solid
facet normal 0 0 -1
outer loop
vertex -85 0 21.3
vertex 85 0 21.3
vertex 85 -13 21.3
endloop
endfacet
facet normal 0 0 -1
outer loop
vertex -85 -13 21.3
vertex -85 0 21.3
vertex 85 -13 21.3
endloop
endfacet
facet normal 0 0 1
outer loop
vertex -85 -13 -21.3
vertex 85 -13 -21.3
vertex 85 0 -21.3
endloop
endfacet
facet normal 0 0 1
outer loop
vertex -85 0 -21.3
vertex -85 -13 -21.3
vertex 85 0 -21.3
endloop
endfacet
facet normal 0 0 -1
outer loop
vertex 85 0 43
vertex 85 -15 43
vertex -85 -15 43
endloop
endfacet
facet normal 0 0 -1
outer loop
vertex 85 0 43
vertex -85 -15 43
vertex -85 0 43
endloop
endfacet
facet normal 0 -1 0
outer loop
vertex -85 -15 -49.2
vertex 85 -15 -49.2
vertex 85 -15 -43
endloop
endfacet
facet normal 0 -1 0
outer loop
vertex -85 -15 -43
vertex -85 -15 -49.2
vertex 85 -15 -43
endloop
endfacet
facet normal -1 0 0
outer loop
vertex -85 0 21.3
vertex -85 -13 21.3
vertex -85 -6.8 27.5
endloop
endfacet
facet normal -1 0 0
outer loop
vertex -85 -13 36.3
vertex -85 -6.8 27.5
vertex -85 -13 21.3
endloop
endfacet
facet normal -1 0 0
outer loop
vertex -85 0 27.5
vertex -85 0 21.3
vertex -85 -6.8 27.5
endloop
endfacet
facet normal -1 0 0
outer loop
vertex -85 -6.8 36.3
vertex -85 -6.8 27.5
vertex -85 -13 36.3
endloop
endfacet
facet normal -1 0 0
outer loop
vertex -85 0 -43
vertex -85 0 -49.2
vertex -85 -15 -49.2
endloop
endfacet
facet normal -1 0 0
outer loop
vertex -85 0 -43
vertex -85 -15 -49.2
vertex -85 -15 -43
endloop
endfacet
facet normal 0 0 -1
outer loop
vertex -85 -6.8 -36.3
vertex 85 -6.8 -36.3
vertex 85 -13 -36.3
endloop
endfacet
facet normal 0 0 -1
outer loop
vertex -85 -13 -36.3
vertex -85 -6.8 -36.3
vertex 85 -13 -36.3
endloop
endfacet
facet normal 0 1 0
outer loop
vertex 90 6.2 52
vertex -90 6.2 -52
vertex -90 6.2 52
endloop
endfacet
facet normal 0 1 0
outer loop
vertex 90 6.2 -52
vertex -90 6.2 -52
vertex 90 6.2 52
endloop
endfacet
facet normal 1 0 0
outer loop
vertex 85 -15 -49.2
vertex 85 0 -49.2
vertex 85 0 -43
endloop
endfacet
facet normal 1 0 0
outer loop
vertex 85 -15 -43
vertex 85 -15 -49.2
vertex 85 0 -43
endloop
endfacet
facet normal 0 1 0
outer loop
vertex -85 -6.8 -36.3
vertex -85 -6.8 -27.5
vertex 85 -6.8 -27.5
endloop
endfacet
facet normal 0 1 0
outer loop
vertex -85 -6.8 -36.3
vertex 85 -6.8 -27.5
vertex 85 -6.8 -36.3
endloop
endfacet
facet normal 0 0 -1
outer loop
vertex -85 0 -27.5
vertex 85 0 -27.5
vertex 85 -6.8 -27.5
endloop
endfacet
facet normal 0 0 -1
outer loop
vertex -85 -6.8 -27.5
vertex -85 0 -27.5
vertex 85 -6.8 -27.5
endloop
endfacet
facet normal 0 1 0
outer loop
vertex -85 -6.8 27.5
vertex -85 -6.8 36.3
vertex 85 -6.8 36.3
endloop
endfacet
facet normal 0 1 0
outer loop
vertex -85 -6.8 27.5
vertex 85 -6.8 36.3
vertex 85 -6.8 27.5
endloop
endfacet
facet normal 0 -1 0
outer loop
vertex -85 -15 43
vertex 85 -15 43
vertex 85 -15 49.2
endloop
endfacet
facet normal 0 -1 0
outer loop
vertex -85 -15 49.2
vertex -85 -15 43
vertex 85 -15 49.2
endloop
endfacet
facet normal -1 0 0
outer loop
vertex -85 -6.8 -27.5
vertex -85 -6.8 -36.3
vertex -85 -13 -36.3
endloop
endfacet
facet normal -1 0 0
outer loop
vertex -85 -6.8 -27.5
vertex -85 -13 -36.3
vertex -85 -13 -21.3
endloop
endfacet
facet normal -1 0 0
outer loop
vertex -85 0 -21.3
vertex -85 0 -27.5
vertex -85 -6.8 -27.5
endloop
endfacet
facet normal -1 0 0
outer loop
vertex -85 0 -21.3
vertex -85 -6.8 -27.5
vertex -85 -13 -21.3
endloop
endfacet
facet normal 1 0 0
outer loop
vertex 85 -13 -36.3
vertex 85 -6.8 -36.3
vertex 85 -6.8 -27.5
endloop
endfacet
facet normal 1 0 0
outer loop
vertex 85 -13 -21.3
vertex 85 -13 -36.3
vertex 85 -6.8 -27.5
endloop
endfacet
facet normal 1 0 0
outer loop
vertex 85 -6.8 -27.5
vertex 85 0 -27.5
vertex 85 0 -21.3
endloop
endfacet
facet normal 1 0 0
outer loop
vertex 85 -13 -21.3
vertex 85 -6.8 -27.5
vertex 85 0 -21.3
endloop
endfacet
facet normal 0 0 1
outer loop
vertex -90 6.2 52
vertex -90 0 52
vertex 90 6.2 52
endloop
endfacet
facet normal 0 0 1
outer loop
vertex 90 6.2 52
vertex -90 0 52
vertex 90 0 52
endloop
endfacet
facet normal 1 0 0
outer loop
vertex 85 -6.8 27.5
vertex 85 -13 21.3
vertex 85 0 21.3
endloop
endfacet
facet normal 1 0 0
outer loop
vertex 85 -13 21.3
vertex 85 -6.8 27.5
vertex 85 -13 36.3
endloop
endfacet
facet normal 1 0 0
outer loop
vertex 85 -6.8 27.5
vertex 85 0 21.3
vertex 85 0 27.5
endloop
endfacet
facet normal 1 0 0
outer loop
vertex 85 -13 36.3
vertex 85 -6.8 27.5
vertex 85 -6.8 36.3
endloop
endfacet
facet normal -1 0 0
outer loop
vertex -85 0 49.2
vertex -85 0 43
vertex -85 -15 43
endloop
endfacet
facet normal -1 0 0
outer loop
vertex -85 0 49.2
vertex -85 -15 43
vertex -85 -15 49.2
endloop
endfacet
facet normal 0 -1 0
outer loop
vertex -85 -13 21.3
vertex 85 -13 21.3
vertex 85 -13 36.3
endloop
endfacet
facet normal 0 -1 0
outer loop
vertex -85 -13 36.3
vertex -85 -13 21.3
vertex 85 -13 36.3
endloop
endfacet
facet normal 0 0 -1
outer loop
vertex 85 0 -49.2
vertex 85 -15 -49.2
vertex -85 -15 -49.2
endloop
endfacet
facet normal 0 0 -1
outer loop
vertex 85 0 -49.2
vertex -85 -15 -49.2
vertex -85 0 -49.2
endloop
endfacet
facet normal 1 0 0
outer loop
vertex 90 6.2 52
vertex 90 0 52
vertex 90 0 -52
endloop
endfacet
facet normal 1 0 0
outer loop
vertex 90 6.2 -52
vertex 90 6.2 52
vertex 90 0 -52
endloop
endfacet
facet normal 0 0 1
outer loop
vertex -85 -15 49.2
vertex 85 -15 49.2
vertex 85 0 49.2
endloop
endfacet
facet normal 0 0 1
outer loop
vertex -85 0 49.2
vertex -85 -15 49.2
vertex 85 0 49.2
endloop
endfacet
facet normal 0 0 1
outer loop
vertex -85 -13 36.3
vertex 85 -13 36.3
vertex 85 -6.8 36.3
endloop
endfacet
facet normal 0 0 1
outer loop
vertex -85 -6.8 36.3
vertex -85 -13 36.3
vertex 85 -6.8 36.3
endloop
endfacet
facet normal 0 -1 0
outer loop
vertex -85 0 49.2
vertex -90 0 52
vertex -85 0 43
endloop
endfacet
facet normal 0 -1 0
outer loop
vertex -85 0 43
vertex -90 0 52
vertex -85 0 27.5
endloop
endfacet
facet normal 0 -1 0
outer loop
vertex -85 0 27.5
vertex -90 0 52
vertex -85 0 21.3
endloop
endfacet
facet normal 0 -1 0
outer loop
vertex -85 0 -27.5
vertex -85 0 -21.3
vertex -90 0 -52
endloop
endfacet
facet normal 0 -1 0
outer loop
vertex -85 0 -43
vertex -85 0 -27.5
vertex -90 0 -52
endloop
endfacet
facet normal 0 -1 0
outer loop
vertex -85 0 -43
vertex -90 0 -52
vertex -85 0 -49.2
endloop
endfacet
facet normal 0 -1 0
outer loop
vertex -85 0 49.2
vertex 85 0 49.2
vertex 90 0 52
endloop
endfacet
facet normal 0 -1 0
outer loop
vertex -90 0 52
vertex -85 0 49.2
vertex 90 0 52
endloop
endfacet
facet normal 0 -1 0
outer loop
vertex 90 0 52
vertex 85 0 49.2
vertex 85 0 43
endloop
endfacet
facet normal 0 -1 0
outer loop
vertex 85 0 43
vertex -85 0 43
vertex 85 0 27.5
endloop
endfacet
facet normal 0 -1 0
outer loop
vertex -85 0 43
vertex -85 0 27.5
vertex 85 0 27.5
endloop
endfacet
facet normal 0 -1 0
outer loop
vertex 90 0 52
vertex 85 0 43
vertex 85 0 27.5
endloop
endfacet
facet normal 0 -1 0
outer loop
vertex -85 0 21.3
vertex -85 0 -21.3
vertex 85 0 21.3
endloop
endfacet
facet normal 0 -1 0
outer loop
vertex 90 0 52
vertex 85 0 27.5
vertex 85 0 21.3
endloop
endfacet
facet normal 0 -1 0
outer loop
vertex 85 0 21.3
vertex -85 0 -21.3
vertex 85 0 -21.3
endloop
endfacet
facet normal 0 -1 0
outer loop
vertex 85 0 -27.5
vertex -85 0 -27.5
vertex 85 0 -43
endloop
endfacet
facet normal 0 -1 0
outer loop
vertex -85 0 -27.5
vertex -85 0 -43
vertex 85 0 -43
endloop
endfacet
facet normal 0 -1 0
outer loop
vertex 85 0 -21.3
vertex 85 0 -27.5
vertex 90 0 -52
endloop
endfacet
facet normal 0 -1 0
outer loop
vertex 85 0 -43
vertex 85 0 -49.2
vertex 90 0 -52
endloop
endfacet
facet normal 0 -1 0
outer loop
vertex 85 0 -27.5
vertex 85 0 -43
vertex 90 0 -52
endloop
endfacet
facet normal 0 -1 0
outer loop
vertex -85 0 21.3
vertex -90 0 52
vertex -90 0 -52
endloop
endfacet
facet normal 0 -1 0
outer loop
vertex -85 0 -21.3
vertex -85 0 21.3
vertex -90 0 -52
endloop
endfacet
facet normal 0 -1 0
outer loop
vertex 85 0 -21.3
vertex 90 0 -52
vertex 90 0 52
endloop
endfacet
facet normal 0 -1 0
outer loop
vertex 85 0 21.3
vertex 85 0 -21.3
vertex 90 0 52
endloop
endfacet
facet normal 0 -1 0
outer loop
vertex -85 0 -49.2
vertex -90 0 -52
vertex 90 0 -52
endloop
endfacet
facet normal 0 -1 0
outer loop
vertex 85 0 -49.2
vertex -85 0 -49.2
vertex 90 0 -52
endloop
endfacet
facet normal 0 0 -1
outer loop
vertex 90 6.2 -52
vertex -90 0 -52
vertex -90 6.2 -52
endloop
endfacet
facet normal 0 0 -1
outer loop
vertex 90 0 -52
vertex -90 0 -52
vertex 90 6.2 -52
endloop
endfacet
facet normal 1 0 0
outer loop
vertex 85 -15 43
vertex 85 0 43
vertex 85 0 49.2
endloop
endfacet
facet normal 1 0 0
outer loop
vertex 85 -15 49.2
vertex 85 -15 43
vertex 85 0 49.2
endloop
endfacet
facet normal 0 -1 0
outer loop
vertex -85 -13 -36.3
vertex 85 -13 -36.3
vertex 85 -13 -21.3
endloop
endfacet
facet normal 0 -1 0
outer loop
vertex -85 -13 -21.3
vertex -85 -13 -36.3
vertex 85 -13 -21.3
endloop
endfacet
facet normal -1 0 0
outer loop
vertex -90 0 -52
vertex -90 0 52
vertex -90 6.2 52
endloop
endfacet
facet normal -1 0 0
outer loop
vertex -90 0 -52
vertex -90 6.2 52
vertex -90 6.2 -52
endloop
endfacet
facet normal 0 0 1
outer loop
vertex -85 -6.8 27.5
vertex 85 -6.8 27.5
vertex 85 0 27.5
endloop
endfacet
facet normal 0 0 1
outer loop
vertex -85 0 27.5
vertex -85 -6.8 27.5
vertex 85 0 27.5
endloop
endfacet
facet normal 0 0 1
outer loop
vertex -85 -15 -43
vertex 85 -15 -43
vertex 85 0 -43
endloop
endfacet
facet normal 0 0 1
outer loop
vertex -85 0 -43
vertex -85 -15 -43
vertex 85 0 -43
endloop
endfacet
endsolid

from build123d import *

# Parameters (mm, degrees)
SKETCH1_W           = 180
SKETCH1_H           = 104
BOSS_EXTRUDE1_DEPTH = 6.2
BOSS_EXTRUDE2_START = 5
SKETCH3_W           = 6.2
SKETCH3_H           = 15
BOSS_EXTRUDE2_DEPTH = 170


with BuildPart() as part:
    # Sketch1 → Boss-Extrude1 (new body)
    with BuildSketch(Plane(origin=(0, 0, 0), x_dir=(1, 0, 0), z_dir=(0, 1, 0))):
        Rectangle(SKETCH1_W, SKETCH1_H)
    extrude(amount=BOSS_EXTRUDE1_DEPTH)

    # Sketch3 → Boss-Extrude2 (add)
    with BuildSketch(Plane.ZY.offset(-90).offset(BOSS_EXTRUDE2_START)):
        with Locations((46.1, -7.5)):
            Rectangle(SKETCH3_W, SKETCH3_H)
        Polygon((36.3, -6.8), (27.5, -6.8), (27.5, 0), (21.3, 0), (21.3, -13), (36.3, -13), align=None)
        Polygon((-21.3, -13), (-21.3, 0), (-27.5, 0), (-27.5, -6.8), (-36.3, -6.8), (-36.3, -13), align=None)
        with Locations((-46.1, -7.5)):
            Rectangle(SKETCH3_W, SKETCH3_H)
    extrude(amount=BOSS_EXTRUDE2_DEPTH)


solid = part.part
